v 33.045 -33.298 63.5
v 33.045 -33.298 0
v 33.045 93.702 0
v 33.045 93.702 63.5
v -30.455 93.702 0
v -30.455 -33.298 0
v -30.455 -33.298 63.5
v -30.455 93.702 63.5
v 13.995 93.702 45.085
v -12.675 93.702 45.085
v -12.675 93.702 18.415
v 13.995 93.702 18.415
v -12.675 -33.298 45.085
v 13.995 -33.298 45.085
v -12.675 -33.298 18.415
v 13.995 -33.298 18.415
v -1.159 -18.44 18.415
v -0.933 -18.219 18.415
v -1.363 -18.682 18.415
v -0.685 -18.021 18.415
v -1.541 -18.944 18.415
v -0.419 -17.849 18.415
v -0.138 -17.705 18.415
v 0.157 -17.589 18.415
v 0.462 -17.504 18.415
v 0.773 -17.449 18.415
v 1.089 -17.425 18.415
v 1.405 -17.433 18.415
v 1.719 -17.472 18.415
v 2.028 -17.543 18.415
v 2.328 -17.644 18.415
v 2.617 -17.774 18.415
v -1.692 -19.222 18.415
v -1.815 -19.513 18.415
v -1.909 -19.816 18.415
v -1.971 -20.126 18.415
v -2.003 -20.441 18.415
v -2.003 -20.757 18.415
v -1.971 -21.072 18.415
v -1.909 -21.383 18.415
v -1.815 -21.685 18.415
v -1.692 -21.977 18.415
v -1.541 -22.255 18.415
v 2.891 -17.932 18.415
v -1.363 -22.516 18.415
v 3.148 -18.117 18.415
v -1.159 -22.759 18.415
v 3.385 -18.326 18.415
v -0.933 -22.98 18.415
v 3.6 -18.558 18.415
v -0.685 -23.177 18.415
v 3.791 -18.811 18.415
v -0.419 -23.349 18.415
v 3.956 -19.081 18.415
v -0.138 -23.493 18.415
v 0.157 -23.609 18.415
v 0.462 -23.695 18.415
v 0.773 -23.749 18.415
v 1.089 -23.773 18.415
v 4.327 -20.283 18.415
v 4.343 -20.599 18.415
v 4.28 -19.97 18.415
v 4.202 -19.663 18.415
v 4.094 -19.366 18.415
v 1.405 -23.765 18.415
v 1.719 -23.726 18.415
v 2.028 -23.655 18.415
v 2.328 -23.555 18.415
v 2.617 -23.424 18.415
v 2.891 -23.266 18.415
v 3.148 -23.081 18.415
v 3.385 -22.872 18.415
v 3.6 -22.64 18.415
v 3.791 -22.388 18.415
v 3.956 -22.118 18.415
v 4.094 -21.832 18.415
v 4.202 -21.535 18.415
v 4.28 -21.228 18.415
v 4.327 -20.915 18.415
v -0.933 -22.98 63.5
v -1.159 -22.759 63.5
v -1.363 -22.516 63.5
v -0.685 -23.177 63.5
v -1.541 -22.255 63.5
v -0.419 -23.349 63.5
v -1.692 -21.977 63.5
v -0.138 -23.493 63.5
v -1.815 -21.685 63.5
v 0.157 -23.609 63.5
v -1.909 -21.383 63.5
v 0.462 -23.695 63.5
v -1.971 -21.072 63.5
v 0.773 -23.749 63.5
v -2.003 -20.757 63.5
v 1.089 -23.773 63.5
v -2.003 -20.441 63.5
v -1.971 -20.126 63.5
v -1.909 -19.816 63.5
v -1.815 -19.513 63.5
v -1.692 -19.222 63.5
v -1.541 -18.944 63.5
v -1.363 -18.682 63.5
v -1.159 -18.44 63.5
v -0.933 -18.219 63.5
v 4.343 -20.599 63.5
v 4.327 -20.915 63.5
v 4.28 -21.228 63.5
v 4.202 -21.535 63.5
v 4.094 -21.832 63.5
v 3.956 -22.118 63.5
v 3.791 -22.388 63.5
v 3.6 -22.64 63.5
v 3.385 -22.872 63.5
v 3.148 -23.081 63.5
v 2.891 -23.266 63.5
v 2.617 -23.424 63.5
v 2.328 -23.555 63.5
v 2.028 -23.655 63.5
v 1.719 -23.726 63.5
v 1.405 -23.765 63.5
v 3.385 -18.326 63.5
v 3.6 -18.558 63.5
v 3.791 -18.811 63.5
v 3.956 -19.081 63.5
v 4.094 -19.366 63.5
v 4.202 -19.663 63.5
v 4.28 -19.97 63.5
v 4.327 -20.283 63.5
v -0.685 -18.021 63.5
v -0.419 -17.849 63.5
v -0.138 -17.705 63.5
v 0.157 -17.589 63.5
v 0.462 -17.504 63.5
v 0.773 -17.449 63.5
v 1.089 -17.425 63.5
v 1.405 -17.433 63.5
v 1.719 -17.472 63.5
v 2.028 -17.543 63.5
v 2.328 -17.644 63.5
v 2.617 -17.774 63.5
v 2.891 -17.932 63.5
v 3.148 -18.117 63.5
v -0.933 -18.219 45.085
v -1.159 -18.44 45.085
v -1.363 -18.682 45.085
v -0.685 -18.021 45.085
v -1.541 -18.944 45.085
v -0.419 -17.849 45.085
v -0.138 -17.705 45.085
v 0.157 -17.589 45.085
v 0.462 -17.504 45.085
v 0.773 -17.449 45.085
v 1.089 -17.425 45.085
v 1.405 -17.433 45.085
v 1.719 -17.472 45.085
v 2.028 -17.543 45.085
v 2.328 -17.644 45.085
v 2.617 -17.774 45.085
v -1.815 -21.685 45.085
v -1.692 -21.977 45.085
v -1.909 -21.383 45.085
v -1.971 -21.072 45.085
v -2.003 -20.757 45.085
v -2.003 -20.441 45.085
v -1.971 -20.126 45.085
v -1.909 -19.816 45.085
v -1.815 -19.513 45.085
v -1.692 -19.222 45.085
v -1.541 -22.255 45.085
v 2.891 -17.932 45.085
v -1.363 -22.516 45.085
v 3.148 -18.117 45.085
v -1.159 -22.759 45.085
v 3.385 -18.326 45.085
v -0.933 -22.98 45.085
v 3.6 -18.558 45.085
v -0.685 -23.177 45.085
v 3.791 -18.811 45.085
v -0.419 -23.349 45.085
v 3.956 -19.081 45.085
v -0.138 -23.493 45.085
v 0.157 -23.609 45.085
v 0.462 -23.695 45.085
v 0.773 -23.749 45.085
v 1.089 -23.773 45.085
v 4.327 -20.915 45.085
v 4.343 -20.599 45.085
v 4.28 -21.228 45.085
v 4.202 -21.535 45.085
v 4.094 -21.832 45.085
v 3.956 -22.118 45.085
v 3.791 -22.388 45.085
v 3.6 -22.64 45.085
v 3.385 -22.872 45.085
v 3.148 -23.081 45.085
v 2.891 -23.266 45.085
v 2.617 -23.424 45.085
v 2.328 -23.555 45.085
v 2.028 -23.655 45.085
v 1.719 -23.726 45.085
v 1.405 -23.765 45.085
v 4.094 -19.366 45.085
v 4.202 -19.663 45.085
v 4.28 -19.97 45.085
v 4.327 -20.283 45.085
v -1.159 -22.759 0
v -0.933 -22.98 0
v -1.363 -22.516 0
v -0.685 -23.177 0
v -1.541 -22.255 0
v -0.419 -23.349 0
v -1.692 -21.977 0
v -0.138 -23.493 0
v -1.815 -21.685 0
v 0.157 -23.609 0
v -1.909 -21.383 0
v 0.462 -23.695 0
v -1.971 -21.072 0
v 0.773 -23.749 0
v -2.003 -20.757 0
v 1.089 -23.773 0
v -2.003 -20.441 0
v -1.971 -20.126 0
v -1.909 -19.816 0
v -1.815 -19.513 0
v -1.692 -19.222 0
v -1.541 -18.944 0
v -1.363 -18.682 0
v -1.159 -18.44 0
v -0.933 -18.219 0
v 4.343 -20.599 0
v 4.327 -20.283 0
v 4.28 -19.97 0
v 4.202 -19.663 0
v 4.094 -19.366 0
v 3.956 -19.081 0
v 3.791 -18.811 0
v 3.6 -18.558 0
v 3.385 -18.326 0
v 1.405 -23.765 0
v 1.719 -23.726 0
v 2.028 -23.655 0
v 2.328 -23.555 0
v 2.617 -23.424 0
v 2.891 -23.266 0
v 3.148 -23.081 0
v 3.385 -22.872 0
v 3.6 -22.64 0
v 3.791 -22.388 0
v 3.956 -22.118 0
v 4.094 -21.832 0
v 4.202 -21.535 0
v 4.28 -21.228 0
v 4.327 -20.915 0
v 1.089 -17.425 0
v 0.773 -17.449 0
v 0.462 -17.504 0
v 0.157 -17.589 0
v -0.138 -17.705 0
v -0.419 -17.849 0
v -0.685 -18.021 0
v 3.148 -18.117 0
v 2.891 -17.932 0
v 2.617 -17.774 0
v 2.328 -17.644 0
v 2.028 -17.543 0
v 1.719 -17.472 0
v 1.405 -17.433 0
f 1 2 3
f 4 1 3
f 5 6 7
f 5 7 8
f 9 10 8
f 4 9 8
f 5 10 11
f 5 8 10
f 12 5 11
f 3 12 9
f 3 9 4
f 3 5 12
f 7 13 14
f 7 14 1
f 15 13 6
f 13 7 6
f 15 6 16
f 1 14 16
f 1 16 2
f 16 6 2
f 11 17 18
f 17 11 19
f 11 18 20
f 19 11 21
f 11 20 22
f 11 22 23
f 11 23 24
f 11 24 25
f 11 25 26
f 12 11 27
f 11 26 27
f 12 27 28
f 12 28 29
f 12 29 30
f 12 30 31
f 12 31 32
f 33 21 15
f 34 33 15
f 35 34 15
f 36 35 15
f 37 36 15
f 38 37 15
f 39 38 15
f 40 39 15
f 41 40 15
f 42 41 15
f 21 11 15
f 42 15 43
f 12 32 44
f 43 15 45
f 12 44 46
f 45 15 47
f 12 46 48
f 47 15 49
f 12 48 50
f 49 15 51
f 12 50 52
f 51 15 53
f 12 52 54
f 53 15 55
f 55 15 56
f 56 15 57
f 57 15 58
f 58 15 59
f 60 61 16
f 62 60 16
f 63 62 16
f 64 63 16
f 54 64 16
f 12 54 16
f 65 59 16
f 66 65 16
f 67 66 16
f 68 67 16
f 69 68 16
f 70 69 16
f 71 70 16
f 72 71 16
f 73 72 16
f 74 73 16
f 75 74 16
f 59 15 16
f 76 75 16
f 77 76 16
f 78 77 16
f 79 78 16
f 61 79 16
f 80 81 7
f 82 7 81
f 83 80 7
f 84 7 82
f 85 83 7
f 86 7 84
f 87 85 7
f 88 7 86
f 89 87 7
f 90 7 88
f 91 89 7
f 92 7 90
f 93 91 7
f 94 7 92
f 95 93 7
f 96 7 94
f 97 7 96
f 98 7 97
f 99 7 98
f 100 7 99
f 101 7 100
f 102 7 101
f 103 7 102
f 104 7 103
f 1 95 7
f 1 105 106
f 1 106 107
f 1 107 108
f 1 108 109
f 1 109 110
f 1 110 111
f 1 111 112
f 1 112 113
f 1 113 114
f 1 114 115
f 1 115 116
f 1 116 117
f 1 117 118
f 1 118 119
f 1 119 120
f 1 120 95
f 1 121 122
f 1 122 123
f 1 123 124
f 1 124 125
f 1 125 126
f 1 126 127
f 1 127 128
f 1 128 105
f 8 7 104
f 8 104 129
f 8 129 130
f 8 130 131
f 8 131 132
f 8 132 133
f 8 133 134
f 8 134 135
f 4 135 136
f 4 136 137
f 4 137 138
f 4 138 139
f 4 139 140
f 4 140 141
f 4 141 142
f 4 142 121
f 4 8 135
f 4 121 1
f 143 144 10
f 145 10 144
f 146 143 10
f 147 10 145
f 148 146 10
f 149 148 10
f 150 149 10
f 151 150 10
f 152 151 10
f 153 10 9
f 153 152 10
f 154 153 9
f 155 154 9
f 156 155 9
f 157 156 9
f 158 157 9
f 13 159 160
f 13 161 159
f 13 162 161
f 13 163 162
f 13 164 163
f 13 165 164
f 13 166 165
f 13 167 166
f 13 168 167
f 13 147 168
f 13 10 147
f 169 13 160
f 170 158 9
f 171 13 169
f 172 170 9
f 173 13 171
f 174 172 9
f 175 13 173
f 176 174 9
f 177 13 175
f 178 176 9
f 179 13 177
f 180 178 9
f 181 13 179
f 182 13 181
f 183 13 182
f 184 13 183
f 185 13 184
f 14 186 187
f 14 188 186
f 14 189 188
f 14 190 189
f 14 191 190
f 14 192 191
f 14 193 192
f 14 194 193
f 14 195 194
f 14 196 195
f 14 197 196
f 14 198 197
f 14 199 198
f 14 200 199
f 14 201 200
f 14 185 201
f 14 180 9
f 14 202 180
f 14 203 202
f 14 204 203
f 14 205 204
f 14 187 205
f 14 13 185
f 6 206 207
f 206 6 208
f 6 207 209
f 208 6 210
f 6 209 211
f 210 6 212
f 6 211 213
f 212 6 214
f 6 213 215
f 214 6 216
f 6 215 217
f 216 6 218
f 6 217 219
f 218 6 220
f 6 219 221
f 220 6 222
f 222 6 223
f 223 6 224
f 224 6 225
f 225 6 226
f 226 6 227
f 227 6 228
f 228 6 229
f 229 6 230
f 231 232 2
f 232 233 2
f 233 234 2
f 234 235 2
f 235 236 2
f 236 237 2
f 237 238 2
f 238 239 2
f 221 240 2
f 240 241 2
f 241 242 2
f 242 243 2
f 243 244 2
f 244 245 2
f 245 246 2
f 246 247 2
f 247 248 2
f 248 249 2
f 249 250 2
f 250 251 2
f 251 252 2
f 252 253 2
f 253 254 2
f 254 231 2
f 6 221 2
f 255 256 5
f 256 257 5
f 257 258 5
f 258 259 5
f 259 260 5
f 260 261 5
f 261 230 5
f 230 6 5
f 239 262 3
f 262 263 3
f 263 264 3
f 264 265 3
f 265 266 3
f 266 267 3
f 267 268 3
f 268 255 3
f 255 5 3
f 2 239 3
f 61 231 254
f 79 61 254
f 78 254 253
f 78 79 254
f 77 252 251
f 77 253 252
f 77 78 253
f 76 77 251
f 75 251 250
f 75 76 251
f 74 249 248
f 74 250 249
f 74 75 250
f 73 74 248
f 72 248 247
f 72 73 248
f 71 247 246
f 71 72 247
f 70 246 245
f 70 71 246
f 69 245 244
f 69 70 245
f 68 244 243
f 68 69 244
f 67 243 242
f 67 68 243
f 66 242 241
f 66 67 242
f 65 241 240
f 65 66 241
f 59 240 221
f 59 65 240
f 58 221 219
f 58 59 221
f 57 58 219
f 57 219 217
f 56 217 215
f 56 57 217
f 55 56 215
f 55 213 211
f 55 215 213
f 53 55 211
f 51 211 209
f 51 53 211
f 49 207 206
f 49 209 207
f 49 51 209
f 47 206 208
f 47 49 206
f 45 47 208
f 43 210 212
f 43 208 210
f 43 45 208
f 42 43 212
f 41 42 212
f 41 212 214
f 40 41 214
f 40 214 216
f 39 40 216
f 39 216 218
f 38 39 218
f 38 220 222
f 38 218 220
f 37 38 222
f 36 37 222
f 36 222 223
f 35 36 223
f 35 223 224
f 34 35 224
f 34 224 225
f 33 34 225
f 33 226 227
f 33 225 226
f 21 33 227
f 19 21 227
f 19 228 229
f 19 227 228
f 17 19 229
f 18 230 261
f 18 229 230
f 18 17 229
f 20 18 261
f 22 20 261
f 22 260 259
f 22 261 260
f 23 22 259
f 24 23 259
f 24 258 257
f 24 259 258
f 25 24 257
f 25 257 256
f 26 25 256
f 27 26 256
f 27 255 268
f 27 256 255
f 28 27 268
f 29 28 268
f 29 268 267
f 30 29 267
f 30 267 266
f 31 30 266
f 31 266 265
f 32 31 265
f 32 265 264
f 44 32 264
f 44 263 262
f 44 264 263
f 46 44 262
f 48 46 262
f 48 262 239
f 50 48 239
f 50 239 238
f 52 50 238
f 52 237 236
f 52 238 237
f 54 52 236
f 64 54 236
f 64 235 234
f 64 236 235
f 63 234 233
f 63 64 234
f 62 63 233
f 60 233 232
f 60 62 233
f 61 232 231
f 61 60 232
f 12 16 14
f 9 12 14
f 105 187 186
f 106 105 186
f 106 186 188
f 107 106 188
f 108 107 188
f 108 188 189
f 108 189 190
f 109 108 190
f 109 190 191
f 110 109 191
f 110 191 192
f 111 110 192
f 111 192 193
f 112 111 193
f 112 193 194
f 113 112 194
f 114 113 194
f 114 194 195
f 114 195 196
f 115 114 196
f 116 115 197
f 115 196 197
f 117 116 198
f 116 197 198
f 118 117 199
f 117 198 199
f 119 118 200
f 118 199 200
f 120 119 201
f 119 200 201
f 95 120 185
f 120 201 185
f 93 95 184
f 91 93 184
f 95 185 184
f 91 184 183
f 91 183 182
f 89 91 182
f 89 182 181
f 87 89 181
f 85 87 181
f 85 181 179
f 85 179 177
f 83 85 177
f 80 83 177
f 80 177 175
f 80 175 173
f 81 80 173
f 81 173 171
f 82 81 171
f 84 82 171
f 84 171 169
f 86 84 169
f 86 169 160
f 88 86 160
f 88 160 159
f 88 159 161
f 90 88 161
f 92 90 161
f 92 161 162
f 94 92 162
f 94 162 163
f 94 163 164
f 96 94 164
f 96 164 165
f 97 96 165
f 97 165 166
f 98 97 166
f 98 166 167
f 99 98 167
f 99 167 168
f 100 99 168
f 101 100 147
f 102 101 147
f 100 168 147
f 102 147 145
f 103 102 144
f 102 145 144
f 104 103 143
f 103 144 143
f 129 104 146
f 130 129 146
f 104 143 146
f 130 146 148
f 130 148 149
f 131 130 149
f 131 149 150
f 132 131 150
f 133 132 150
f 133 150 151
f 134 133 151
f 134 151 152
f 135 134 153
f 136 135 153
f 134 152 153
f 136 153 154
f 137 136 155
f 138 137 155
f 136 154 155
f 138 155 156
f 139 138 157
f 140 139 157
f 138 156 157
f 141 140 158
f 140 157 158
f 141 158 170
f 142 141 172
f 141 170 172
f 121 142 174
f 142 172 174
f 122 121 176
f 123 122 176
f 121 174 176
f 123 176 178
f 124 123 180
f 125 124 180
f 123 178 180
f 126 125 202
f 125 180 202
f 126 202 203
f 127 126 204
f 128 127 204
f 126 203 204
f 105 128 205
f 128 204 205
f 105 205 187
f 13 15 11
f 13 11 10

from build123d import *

# Parameters (mm, degrees)
F0_W          = 63.5
F0_H          = 127
F1_DEPTH      = 63.5
F2_W          = 26.67
F2_H          = 26.67
F3_DEPTH      = 127.001
F4_R          = 3.175
F5_DEPTH      = 45.086
F5_DEPTH_BACK = 25.4


with BuildPart() as f1:
    # F0 (on Top) → F1 (new body)
    with BuildSketch(Plane.XY):
        with Locations((1.295127, 30.201528)):
            Rectangle(F0_W, F0_H)
    extrude(amount=F1_DEPTH)

    # F2 (on face) → F3 (cut, through all)
    with BuildSketch(Plane.XZ.offset(33.298472)):
        with Locations((0.660127, 31.75)):
            Rectangle(F2_W, F2_H)
    extrude(amount=-F3_DEPTH, mode=Mode.SUBTRACT)

    # F4 (on face) → F5 (cut, two sides)
    with BuildSketch(Plane(origin=(0, 0, 45.085), x_dir=(1, 0, 0), z_dir=(0, 0, -1))) as f5_sk:
        with Locations((1.168133, 20.599107)):
            Circle(F4_R)
    extrude(amount=F5_DEPTH, mode=Mode.SUBTRACT)
    extrude(f5_sk.sketch, amount=-F5_DEPTH_BACK, mode=Mode.SUBTRACT)


solid = f1.part
